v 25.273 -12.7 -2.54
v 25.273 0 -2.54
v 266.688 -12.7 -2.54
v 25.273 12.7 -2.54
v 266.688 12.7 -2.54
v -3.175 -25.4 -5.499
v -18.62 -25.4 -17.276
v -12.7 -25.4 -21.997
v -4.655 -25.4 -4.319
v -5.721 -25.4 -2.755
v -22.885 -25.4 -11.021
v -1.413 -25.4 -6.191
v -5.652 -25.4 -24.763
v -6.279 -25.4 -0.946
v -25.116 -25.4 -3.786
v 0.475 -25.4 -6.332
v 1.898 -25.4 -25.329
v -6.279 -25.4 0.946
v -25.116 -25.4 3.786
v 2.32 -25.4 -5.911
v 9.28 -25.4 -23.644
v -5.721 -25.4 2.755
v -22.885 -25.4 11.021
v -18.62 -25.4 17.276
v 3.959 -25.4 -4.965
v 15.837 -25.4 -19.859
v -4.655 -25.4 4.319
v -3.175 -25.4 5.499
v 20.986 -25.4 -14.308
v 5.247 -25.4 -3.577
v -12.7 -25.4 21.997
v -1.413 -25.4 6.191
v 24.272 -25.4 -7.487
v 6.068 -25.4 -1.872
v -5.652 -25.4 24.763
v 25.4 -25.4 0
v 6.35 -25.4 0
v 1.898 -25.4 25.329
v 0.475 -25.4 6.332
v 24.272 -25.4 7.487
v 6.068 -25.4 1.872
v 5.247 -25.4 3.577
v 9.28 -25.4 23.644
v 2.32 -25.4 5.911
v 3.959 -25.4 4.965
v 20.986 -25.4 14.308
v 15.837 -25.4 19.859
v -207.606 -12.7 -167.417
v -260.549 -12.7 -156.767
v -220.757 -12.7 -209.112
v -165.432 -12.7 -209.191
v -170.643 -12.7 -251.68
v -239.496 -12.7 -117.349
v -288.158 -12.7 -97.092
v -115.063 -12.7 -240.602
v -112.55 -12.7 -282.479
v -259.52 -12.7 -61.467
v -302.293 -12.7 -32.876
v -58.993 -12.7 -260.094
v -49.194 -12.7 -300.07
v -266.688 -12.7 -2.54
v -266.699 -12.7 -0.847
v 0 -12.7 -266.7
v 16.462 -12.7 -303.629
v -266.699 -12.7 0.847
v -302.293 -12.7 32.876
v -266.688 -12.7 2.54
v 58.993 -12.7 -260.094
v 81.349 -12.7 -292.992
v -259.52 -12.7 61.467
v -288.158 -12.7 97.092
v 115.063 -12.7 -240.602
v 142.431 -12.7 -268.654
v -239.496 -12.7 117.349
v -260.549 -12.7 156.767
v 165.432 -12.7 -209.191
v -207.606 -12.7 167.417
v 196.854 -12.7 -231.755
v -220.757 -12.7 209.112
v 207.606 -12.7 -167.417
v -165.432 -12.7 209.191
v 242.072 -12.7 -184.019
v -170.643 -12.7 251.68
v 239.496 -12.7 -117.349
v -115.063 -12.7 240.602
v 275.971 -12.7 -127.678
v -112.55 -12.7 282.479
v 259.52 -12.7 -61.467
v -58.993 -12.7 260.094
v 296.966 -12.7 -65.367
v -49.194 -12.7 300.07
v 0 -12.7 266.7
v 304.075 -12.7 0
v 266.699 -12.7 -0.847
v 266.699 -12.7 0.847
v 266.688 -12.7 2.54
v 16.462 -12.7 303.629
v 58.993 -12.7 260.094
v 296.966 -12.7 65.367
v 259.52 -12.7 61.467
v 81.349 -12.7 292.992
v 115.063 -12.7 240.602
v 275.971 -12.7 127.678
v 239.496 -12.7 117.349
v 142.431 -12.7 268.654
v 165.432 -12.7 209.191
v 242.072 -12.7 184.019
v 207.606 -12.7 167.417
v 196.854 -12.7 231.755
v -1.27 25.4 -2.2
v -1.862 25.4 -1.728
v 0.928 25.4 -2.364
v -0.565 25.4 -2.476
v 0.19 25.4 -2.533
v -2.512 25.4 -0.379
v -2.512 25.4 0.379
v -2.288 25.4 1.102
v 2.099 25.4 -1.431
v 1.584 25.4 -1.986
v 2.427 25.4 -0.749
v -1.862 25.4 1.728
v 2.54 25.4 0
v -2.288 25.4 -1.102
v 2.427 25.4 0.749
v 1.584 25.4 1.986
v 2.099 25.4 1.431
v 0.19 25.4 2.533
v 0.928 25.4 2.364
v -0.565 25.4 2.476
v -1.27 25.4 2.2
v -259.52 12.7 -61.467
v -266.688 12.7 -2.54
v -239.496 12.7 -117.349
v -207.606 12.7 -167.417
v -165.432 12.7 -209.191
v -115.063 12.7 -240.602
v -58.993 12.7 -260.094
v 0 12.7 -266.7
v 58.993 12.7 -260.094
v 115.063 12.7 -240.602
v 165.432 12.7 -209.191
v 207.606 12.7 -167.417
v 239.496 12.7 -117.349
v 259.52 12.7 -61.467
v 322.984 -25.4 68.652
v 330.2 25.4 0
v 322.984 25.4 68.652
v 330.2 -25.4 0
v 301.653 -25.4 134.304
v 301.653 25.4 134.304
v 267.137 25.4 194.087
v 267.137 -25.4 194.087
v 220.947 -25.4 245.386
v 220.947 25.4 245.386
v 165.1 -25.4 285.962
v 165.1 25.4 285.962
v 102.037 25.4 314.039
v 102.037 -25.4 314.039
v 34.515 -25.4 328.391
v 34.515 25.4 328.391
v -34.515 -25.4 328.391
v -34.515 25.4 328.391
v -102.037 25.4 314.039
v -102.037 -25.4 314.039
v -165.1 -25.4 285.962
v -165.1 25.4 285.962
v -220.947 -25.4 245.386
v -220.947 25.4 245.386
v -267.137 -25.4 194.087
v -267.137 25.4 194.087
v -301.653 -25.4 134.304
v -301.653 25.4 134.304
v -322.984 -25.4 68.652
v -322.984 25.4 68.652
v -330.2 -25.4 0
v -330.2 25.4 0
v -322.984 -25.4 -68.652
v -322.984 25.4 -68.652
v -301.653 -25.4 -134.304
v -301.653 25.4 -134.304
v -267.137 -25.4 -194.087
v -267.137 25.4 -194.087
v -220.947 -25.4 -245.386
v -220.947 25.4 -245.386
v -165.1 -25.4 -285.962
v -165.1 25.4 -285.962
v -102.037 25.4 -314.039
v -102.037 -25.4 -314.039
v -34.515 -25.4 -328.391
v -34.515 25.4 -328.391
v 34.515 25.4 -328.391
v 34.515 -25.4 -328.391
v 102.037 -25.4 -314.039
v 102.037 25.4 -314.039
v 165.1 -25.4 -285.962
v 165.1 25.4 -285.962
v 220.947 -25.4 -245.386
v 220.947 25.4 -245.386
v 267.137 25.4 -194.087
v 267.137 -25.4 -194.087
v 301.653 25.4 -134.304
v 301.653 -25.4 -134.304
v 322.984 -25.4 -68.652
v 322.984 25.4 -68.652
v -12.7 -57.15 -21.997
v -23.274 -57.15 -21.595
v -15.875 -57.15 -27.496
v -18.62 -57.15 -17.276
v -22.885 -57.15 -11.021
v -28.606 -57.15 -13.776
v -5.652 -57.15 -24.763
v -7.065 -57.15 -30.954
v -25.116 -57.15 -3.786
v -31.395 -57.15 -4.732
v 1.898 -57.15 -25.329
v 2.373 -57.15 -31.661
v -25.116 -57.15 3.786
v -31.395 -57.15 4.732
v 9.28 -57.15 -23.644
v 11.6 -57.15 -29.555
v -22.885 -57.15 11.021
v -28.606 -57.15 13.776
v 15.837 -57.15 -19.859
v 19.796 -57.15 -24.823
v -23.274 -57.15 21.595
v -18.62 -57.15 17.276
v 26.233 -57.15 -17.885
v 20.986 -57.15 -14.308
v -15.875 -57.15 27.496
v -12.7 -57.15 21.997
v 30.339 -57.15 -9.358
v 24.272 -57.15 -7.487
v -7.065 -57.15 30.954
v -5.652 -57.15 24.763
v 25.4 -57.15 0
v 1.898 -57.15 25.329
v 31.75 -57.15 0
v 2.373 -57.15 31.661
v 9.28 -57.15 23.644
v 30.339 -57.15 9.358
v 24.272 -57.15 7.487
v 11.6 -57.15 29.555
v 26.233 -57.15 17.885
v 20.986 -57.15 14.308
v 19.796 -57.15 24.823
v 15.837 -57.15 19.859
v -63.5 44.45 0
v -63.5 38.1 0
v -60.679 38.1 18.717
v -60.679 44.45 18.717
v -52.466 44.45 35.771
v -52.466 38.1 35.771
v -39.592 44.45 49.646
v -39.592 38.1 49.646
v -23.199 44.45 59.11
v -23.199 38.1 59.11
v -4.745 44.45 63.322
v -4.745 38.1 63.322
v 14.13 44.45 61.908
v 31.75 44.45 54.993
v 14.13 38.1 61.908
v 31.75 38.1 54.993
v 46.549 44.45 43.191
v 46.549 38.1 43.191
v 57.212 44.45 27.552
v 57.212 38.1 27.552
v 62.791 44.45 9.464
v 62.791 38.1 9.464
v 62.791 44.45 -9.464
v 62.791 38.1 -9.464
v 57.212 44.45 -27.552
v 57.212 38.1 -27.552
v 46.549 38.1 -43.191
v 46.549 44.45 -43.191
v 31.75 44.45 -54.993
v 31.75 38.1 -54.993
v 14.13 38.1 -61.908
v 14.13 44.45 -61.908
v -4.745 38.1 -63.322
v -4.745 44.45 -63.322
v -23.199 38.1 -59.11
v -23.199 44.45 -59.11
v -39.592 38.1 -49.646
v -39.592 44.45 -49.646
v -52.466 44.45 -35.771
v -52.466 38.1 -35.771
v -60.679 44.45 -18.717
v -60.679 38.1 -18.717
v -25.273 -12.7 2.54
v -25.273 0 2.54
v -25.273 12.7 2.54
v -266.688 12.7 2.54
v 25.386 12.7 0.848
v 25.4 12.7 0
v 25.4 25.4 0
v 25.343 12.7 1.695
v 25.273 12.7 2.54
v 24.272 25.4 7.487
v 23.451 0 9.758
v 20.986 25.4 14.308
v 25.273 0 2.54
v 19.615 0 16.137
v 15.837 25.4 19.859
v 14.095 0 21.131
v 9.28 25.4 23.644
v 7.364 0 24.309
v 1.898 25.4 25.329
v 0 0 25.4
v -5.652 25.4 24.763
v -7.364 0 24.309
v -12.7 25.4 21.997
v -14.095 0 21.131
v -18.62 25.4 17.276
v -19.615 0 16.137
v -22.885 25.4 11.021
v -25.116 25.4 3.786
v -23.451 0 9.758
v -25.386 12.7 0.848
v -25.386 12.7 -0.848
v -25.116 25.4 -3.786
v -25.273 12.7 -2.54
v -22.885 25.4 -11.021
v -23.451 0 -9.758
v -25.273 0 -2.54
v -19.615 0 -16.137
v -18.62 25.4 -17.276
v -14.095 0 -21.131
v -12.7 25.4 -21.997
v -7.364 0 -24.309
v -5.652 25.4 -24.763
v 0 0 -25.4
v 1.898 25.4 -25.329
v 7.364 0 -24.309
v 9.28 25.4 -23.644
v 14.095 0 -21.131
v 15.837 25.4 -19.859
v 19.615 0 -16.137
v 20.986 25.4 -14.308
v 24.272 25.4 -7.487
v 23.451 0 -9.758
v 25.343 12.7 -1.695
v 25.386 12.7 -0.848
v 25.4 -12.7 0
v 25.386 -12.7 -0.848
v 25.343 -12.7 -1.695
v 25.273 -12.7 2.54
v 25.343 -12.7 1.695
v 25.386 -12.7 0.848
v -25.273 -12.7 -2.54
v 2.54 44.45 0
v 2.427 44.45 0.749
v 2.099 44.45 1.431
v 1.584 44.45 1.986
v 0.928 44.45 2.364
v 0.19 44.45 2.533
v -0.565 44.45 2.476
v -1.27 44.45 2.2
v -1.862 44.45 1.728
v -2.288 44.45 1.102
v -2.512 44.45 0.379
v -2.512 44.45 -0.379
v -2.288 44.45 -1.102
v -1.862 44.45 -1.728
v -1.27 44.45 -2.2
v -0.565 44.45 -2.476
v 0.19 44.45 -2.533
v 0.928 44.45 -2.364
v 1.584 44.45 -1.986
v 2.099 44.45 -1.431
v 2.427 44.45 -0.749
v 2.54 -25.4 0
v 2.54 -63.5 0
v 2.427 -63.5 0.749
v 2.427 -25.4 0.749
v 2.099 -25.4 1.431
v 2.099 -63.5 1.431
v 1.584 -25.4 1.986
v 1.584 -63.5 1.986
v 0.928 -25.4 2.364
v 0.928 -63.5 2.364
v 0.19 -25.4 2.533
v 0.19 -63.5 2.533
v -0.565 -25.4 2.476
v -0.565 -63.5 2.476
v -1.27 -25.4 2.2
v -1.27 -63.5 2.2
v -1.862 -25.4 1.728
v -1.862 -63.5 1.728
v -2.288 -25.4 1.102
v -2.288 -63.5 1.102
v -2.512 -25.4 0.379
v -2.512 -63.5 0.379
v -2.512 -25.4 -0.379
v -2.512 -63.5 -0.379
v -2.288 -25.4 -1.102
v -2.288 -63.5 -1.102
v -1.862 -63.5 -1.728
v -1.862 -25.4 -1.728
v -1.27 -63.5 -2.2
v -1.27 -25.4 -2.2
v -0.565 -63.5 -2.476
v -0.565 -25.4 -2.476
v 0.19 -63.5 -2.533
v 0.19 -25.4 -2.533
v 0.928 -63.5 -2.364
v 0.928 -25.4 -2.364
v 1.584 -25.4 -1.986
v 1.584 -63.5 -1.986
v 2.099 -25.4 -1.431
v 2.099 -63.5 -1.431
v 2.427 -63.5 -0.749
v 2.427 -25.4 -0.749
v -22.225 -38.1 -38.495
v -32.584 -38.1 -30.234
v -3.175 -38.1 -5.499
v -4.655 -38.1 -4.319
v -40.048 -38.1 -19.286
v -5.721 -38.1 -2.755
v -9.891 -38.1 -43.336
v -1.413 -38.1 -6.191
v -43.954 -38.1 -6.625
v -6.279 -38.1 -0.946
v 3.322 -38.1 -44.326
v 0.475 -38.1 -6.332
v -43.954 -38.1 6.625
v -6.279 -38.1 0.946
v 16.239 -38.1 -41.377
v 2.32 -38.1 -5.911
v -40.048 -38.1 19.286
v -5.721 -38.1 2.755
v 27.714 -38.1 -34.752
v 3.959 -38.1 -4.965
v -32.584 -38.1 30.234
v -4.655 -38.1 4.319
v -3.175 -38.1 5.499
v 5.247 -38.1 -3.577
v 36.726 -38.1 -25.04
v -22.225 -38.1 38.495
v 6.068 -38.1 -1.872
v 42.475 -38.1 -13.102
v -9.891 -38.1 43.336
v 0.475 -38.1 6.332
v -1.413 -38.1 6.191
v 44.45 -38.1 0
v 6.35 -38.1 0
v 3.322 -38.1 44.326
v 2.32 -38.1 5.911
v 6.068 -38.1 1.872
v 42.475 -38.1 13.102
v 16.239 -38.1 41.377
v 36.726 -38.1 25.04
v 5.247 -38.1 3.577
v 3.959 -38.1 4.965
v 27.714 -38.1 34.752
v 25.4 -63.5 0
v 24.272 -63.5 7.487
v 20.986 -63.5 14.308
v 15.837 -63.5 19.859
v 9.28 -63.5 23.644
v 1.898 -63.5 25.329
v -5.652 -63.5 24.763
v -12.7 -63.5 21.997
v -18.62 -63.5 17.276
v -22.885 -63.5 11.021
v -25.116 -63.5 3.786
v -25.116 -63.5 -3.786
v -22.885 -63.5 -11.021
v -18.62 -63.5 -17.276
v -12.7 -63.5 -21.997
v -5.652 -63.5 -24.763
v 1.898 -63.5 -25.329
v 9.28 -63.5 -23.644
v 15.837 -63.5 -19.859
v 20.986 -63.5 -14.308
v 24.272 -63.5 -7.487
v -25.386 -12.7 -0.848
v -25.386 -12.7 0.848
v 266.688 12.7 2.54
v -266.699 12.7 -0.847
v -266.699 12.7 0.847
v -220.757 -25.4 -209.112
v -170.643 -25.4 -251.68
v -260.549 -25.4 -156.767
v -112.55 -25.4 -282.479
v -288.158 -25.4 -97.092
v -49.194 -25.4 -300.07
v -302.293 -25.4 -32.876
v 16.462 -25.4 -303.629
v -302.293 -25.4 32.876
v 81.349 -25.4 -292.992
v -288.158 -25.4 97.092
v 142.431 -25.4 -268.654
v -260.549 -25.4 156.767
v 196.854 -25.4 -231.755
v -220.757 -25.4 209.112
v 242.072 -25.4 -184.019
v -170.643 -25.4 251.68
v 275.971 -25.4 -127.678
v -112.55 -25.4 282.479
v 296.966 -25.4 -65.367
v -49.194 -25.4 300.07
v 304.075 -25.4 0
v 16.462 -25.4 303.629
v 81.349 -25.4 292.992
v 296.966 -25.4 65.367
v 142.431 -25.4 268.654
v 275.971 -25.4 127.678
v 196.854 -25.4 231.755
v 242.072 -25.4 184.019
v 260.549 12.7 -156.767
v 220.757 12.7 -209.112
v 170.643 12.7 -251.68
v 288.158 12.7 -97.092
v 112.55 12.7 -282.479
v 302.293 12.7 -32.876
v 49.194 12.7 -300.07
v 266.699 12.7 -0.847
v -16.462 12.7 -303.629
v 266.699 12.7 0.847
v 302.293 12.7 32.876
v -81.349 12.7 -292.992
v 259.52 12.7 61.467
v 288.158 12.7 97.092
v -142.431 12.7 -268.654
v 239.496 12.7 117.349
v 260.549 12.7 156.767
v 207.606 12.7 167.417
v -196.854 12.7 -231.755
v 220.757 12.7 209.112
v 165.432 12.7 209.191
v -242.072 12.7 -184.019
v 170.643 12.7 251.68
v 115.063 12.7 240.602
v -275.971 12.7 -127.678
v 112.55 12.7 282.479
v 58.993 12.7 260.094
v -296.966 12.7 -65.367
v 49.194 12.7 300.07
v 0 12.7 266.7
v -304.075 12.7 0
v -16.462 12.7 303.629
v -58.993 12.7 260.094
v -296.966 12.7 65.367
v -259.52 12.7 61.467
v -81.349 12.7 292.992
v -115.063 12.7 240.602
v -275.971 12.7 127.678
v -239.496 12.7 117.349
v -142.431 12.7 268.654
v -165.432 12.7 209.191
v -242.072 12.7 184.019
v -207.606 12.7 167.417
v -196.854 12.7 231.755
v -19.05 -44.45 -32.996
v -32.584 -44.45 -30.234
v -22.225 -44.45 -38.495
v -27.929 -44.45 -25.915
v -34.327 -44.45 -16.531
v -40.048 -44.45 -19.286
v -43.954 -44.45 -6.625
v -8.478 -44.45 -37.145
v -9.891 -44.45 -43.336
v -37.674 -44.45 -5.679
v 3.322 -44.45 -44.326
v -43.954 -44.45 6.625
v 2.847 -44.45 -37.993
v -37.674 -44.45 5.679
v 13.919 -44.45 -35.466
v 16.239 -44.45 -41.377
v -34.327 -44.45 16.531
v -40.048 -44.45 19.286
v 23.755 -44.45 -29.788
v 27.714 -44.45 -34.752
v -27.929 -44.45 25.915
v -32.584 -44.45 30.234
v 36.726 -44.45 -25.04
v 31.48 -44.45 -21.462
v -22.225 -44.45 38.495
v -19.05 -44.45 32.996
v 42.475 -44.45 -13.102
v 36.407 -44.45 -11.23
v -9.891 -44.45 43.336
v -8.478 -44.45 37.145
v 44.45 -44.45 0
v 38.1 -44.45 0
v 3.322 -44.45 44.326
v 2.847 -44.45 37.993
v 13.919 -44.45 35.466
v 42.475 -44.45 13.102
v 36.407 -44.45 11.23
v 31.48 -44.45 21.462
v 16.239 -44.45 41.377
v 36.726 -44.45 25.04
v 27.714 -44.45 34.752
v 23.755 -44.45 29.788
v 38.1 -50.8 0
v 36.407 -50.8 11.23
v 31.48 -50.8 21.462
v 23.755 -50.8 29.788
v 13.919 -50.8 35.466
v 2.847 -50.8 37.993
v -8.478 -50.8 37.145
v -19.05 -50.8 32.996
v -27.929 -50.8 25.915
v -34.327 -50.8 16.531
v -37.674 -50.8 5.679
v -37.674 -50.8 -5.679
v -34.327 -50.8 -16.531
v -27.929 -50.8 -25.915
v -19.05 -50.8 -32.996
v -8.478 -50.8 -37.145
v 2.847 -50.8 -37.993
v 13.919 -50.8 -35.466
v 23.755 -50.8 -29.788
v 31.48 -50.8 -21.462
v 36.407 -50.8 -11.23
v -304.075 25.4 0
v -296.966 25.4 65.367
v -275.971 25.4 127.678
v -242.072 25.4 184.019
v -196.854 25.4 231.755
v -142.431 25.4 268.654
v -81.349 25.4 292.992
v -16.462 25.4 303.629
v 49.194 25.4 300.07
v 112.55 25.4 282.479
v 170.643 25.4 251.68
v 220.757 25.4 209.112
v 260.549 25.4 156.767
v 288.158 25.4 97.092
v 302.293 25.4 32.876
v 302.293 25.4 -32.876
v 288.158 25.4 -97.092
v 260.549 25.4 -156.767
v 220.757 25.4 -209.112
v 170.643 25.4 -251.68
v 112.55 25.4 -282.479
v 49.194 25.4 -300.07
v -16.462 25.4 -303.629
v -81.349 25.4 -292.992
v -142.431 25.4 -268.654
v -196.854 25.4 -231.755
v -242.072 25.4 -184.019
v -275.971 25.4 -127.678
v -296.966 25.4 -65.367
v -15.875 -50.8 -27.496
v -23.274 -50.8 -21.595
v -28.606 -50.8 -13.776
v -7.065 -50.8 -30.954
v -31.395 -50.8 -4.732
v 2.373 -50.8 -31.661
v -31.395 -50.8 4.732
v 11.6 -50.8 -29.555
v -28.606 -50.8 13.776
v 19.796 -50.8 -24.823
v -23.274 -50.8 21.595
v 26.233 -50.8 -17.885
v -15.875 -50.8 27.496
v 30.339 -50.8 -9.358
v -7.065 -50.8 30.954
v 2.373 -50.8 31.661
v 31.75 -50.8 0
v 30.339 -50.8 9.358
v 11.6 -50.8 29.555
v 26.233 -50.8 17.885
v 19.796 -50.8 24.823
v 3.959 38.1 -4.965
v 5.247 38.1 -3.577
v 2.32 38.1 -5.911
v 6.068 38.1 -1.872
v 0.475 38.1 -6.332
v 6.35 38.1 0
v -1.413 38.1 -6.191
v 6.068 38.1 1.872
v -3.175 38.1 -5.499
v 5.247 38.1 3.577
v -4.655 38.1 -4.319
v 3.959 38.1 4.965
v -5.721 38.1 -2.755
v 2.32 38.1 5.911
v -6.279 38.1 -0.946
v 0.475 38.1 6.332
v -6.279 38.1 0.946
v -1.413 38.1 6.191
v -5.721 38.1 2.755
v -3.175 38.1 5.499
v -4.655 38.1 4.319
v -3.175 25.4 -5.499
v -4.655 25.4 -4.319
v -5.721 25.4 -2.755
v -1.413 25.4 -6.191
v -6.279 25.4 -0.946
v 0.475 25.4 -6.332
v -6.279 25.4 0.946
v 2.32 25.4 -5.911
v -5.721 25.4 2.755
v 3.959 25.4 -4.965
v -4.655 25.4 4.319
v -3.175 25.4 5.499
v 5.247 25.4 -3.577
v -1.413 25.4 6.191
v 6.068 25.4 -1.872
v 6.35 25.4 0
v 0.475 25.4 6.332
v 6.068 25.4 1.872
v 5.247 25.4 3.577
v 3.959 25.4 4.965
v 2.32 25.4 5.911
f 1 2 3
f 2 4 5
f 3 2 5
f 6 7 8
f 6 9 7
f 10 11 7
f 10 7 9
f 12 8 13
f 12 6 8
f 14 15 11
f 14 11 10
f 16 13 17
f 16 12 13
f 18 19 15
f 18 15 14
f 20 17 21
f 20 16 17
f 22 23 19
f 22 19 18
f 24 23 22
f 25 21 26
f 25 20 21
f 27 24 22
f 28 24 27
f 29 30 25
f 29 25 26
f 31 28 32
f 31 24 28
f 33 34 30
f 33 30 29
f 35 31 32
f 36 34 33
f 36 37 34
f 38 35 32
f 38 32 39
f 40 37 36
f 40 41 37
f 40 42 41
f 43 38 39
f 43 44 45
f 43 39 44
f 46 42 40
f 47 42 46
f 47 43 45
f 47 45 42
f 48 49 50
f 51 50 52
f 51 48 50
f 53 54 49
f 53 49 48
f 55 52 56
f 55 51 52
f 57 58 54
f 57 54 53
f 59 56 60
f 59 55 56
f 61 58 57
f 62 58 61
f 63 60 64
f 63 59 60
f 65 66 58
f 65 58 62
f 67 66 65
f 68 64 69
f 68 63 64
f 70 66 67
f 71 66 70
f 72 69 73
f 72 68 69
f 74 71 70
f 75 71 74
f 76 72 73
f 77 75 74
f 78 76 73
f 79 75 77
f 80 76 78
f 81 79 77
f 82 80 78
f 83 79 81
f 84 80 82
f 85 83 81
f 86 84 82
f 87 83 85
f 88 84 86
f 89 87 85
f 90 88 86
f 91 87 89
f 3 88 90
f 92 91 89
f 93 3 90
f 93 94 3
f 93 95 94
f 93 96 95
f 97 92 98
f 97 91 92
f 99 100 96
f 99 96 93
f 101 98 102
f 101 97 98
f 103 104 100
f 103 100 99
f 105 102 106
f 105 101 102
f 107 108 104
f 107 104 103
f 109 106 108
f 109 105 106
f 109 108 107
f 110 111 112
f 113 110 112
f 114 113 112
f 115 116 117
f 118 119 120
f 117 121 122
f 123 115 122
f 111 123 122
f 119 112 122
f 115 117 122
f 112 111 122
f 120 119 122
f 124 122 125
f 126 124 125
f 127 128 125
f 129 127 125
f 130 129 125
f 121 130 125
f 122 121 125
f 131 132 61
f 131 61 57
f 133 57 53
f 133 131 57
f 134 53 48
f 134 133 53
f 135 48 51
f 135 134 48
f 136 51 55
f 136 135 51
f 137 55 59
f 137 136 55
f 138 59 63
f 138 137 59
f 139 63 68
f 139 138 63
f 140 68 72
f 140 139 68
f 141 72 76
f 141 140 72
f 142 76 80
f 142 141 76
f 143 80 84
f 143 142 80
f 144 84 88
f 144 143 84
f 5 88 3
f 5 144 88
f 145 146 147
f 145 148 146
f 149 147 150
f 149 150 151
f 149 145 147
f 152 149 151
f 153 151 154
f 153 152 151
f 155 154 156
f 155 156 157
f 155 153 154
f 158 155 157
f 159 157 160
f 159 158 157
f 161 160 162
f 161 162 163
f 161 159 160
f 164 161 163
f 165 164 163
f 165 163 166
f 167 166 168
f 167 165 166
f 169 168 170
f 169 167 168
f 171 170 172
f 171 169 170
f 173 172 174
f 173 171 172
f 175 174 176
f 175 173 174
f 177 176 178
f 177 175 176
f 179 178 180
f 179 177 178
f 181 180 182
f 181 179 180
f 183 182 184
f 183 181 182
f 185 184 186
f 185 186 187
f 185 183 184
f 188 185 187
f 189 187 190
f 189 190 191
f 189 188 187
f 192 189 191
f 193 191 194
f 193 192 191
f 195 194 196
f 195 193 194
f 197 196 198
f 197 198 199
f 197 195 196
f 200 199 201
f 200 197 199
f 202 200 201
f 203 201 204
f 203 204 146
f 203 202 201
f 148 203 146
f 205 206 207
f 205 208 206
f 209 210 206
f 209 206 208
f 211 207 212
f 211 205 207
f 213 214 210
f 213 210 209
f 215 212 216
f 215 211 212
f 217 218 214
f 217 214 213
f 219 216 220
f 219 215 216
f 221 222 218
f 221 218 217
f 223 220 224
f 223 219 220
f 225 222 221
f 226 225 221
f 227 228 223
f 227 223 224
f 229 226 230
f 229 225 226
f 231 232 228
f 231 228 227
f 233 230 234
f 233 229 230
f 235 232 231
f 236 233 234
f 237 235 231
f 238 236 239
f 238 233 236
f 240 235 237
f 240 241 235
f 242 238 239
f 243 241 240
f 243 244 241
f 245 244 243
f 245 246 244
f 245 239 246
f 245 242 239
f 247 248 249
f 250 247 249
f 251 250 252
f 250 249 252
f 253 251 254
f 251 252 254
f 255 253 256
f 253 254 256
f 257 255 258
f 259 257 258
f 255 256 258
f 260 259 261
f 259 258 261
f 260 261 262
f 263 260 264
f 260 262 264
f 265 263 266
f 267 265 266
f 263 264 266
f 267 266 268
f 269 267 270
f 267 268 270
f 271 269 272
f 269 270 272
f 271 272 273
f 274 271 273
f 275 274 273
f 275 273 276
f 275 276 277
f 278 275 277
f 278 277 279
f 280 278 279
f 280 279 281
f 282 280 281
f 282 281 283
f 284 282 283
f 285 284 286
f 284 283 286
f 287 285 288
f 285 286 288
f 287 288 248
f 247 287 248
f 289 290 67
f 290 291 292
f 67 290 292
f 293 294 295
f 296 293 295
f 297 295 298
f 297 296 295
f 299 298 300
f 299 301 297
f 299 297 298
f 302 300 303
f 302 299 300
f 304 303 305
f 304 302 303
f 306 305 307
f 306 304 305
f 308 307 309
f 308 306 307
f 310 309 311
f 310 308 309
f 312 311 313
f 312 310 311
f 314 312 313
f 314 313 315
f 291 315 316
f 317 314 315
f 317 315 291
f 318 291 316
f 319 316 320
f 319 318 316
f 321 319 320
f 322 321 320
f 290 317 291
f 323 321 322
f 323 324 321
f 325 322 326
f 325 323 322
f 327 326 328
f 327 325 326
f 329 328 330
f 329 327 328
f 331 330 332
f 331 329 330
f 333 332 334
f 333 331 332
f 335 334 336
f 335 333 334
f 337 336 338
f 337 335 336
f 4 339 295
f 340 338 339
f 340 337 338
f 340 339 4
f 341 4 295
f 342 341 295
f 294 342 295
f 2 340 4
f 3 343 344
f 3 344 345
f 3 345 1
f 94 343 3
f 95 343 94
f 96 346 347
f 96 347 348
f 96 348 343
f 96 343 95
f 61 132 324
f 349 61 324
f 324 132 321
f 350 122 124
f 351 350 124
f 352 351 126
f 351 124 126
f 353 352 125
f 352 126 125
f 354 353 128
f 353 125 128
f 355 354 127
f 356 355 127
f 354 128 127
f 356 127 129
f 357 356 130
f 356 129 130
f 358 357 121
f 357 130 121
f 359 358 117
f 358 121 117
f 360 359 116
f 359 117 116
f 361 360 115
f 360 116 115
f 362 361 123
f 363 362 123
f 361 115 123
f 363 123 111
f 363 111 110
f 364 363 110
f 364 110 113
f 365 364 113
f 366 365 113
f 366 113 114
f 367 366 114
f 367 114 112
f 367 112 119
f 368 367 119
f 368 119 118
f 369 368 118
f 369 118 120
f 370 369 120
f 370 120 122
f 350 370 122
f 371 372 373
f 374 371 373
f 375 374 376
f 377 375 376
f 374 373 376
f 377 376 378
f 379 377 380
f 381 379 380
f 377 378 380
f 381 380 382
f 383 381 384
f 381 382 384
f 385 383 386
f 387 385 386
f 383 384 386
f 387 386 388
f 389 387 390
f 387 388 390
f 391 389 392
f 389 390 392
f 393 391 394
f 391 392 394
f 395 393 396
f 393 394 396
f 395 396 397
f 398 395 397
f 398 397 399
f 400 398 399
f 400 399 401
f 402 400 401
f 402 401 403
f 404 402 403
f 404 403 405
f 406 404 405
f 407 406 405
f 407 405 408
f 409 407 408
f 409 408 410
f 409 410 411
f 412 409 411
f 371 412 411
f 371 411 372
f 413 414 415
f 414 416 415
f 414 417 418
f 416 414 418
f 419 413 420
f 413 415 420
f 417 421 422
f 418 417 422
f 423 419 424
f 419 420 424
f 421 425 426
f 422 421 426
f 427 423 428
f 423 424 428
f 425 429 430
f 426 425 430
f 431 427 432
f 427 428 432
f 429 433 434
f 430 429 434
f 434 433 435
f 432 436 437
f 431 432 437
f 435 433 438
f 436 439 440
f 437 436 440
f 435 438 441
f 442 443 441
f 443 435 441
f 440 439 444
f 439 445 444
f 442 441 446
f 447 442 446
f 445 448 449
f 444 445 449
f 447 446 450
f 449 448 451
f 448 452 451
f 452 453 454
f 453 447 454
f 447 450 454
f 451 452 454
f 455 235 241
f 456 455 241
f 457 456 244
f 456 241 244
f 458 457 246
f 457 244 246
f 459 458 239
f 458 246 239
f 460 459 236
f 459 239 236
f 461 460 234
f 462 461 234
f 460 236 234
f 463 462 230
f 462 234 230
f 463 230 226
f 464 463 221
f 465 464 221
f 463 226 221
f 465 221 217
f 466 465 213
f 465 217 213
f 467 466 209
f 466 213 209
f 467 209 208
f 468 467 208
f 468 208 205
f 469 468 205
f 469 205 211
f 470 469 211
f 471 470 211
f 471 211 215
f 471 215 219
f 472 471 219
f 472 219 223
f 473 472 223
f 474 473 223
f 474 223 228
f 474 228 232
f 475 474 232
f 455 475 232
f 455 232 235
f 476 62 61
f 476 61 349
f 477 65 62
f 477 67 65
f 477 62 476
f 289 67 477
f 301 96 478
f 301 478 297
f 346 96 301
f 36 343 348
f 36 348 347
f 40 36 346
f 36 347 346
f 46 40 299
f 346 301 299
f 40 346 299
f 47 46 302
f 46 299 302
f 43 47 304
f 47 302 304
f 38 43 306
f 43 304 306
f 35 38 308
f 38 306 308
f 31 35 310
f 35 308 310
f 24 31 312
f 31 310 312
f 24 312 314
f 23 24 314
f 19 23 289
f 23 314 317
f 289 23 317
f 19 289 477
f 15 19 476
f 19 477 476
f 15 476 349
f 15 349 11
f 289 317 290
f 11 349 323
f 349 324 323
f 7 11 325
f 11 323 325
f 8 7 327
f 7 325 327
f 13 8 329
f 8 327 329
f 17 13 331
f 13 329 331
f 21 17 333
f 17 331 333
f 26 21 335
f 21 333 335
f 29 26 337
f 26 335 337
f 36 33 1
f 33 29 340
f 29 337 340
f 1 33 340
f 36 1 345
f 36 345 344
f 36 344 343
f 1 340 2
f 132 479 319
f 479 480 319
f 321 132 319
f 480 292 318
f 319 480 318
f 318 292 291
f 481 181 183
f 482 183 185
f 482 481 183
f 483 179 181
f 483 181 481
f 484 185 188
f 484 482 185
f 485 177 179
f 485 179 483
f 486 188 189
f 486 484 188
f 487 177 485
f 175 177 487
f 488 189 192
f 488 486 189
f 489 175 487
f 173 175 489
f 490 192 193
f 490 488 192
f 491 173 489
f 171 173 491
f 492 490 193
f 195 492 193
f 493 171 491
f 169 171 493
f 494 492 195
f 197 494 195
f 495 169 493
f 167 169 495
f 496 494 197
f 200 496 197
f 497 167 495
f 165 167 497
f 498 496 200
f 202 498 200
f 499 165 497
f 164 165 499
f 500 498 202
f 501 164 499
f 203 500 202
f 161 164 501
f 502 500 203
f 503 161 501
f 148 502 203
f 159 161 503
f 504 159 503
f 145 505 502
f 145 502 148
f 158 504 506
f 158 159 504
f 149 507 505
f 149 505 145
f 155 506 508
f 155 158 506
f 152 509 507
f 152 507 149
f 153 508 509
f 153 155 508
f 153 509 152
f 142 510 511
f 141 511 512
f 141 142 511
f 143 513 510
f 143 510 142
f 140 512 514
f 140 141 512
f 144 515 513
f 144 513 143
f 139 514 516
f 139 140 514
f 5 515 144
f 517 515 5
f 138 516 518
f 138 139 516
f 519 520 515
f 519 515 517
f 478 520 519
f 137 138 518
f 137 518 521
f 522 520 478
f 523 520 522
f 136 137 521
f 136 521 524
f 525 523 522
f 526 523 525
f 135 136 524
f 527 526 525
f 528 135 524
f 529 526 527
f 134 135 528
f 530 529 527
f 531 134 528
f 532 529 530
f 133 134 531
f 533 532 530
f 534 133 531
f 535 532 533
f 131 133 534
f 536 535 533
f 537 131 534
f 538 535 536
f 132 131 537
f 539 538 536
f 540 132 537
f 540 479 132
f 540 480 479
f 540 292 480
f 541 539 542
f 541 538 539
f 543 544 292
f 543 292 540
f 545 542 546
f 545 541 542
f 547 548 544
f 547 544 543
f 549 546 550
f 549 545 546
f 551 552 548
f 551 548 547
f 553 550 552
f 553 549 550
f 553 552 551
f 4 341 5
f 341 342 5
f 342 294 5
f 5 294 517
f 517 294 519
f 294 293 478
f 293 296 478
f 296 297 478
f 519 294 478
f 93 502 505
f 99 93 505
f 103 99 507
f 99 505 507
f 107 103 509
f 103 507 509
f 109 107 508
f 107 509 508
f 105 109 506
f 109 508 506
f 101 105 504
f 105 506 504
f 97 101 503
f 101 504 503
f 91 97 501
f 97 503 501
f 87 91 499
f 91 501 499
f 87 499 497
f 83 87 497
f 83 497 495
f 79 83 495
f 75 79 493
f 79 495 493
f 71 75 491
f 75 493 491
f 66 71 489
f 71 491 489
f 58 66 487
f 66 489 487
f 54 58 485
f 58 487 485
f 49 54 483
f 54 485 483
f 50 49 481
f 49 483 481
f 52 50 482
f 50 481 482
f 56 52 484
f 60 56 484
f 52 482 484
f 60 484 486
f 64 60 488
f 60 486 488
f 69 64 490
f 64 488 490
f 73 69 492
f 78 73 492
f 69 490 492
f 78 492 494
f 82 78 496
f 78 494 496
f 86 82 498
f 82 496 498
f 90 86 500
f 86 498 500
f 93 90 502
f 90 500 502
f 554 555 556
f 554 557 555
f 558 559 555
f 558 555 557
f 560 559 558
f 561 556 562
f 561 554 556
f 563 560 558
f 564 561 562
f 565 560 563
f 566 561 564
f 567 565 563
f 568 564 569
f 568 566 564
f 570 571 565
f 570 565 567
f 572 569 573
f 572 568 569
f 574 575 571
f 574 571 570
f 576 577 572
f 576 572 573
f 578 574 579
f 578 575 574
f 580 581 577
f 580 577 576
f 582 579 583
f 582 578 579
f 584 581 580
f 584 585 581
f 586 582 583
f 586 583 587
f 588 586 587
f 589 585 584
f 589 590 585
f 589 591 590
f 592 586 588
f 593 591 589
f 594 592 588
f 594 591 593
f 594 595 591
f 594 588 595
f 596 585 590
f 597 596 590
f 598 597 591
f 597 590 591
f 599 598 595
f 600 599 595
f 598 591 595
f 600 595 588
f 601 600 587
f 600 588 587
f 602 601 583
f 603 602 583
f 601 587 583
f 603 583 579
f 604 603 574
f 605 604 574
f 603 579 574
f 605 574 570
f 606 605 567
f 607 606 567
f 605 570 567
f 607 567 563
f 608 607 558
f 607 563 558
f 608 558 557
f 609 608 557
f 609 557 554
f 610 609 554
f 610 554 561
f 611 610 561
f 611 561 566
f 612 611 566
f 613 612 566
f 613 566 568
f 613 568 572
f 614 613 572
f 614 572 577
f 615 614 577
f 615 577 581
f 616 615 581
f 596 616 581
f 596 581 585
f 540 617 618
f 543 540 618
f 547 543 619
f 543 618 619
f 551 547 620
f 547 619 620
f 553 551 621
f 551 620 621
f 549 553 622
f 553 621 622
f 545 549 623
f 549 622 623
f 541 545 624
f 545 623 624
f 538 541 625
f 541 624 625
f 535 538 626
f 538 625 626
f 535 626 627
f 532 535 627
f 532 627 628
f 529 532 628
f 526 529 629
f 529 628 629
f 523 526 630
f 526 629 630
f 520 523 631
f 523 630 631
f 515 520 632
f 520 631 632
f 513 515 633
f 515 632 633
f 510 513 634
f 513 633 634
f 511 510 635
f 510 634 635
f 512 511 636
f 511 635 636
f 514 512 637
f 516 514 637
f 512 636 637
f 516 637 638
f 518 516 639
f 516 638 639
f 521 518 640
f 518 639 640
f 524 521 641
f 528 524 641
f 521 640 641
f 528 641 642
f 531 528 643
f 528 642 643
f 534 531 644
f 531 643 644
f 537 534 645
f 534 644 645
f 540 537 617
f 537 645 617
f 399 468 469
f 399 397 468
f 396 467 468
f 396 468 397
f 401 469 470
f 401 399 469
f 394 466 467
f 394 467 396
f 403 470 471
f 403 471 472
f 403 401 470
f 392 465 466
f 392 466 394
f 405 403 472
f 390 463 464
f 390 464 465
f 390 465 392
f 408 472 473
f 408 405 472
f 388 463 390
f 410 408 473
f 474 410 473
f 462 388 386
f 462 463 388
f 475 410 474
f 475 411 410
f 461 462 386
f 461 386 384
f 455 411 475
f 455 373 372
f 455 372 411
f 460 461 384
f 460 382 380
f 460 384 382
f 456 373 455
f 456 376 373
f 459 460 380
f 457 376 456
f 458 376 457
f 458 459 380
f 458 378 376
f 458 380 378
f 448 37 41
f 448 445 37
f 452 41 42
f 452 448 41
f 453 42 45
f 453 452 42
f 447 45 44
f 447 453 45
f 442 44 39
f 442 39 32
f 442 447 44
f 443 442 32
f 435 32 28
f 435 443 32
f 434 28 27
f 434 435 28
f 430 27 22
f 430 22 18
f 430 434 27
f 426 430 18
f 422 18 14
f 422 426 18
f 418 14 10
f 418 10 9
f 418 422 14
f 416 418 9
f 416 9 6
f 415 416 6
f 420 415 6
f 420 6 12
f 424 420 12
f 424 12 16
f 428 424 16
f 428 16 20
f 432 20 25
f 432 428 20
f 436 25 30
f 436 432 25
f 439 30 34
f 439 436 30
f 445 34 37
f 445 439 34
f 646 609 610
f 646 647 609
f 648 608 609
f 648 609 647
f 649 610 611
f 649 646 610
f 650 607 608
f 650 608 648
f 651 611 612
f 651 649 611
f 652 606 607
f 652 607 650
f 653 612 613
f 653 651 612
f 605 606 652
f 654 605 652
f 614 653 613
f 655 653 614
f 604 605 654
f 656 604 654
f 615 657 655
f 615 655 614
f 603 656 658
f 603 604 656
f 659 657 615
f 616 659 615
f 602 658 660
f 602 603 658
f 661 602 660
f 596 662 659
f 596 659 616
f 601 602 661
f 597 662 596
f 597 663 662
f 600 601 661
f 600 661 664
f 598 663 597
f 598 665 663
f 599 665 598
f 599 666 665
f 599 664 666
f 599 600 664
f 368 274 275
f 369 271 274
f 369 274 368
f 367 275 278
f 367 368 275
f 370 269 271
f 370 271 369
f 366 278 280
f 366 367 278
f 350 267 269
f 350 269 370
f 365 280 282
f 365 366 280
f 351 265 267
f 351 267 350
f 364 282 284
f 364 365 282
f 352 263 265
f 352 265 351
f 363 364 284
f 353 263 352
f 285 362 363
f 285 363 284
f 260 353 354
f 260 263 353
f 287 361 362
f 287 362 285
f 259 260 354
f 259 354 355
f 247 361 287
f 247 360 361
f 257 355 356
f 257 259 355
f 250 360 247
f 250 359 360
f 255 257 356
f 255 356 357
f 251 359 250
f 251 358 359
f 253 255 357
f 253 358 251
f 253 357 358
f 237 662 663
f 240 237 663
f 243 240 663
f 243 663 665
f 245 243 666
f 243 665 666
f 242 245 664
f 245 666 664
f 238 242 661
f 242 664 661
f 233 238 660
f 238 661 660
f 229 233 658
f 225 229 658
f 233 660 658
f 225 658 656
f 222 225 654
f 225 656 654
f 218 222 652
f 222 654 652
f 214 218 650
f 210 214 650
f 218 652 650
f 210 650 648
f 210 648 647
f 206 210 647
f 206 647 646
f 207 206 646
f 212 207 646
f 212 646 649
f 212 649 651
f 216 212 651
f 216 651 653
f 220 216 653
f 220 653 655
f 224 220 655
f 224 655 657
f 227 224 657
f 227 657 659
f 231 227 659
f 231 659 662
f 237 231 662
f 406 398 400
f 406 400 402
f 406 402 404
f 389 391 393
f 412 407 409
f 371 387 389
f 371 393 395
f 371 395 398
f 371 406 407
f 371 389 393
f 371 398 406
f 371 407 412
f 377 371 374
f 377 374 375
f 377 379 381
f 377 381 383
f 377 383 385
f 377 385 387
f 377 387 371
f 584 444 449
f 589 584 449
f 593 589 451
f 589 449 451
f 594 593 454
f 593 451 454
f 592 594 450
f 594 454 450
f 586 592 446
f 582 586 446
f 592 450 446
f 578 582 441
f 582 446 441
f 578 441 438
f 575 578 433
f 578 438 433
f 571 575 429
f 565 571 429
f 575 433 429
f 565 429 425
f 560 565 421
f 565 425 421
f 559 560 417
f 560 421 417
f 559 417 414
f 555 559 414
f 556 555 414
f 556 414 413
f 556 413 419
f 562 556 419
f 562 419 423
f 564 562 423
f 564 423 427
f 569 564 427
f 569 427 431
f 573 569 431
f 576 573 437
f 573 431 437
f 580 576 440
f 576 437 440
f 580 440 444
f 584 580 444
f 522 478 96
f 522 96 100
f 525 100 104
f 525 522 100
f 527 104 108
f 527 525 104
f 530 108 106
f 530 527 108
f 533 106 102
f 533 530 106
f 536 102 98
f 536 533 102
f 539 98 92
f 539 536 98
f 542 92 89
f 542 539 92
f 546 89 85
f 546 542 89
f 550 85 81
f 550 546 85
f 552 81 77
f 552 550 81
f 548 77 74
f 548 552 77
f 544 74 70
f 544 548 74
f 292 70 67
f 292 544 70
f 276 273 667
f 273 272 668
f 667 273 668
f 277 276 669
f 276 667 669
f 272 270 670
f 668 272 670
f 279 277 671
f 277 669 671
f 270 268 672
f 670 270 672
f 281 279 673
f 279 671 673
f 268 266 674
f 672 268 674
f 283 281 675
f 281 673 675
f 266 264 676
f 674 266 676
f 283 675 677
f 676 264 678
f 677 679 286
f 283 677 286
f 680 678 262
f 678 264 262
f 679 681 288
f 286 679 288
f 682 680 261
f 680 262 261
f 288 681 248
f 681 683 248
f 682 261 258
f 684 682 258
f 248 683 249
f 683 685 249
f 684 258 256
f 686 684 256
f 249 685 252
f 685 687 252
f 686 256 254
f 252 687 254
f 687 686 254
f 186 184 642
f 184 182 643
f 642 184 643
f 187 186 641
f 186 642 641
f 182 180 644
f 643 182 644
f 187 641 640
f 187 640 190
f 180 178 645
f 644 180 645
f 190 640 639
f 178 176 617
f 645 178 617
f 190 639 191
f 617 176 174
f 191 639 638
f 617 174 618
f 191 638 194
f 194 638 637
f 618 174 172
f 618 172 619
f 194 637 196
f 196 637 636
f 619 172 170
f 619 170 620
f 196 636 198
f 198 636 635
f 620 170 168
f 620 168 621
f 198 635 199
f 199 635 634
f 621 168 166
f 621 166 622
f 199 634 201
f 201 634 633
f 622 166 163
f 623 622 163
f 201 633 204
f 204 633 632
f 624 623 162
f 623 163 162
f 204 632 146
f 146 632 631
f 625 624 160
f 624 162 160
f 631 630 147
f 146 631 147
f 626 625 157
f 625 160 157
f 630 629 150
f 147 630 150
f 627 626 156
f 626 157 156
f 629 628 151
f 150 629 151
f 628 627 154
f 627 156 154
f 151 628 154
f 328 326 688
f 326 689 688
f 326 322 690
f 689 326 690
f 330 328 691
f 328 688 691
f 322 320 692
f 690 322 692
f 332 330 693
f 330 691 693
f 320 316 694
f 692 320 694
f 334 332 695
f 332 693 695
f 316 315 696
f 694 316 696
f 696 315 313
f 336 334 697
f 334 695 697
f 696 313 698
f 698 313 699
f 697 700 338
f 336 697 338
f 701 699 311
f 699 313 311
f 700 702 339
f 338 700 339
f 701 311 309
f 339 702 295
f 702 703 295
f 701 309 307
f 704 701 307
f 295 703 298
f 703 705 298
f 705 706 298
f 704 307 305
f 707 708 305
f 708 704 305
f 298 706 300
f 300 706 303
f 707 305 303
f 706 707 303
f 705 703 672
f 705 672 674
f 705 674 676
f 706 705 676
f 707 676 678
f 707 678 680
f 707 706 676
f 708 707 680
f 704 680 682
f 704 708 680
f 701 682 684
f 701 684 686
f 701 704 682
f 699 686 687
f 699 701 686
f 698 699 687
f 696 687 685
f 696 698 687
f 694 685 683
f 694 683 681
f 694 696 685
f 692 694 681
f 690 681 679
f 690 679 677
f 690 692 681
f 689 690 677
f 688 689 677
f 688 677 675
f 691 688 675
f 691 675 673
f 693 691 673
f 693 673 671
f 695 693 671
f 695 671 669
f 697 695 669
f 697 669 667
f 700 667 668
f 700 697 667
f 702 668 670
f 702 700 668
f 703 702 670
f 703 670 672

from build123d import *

# Parameters (mm, degrees)
F0_R           = 330.2
F0_R_2         = 266.7
F1_DEPTH       = 25.4
F1_DEPTH_BACK  = 25.4
F3_R           = 44.45
F3_R_2         = 38.1
F4_DEPTH       = 6.35
F3_R_3         = 31.75
F5_DEPTH       = 12.7
F3_R_4         = 25.4
F6_DEPTH       = 19.05
F3_R_5         = 19.05
F7_DEPTH       = 25.4
F9_R           = 63.5
F10_DEPTH      = 6.35
F3_R_6         = 6.35
F11_DEPTH      = 25.4
F11_DEPTH_BACK = 76.2
F12_R          = 19.05
F12_R_2        = 2.54
F13_DEPTH      = 25.4
F14_DEPTH      = 107.951
F16_DEPTH      = 12.7
F16_DEPTH_BACK = 12.7
F17_DEPTH      = 107.951
F18_R          = 25.4
F19_DEPTH      = 25.4
F19_DEPTH_BACK = 25.4
F20_R          = 304.0753924765
F20_R_2        = 266.7
F21_DEPTH      = 12.7
F22_R          = 304.0753924765
F22_R_2        = 266.7
F23_DEPTH      = 12.7


with BuildPart() as f1:
    # F0 (on Front) → F1 (new body, two sides)
    with BuildSketch(Plane.XZ) as f1_sk:
        Circle(F0_R)
        Circle(F0_R_2, mode=Mode.SUBTRACT)
    extrude(amount=F1_DEPTH)
    extrude(f1_sk.sketch, amount=-F1_DEPTH_BACK)



with BuildPart() as f4:
    # F3 (on offset) → F4 (new body)
    with BuildSketch(Plane.XZ.offset(38.1)):
        Circle(F3_R)
        Circle(F3_R_2, mode=Mode.SUBTRACT)
    extrude(amount=F4_DEPTH)

    # F3 (on offset) → F5 (join)
    with BuildSketch(Plane.XZ.offset(38.1)):
        Circle(F3_R_2)
        Circle(F3_R_3, mode=Mode.SUBTRACT)
    extrude(amount=F5_DEPTH)

    # F3 (on offset) → F6 (join)
    with BuildSketch(Plane.XZ.offset(38.1)):
        Circle(F3_R_3)
        Circle(F3_R_4, mode=Mode.SUBTRACT)
    extrude(amount=F6_DEPTH)

    # F3 (on offset) → F7 (join)
    with BuildSketch(Plane.XZ.offset(38.1)):
        Circle(F3_R_4)
        Circle(F3_R_5, mode=Mode.SUBTRACT)
    extrude(amount=F7_DEPTH)



with BuildPart() as f10:
    # F9 (on offset) → F10 (new body)
    with BuildSketch(Plane(origin=(0, 38.1, 0), x_dir=(-1, 0, 0), z_dir=(0, 1, 0))):
        Circle(F9_R)
    extrude(amount=F10_DEPTH)

    # F3 (on offset) → F11 (join, two sides)
    with BuildSketch(Plane.XZ.offset(38.1)) as f11_sk:
        Circle(F3_R_6)
    extrude(amount=F11_DEPTH)
    extrude(f11_sk.sketch, amount=-F11_DEPTH_BACK)


with BuildPart() as f4_1:
    add(f4.part)

    add(f10.part)  # F13 merges F10
    # F12 (on face) → F13 (join)
    with BuildSketch(Plane.XZ.offset(63.5)):
        Circle(F12_R)
        Circle(F12_R_2, mode=Mode.SUBTRACT)
    extrude(amount=-F13_DEPTH)

    # F12 (on face) → F14 (cut, through all)
    with BuildSketch(Plane.XZ.offset(63.5)):
        Circle(F12_R_2)
    extrude(amount=-F14_DEPTH, mode=Mode.SUBTRACT)


with BuildPart() as f1_1:
    add(f1.part)

    add(f4_1.part)  # F16 merges F4
    # F15 (on Front) → F16 (join, two sides)
    with BuildSketch(Plane.XZ) as f16_sk:
        with BuildLine():
            Line((304.8, 2.54), (5.8198711326, 2.54))
            ThreePointArc((5.8198711326, 2.54), (6.2160550871, 1.2973662374), (6.35, 0))
            ThreePointArc((6.35, 0), (6.2160550871, -1.2973662374), (5.8198711326, -2.54))
            Line((5.8198711326, -2.54), (304.8, -2.54))
            Line((304.8, -2.54), (304.8, 2.54))
        make_face()
        with BuildLine():
            ThreePointArc((-5.8198711326, -2.54), (-6.35, 0), (-5.8198711326, 2.54))
            Line((-5.8198711326, 2.54), (-304.8, 2.54))
            Line((-304.8, 2.54), (-304.8, -2.54))
            Line((-304.8, -2.54), (-5.8198711326, -2.54))
        make_face()
    extrude(amount=F16_DEPTH)
    extrude(f16_sk.sketch, amount=-F16_DEPTH_BACK)

    # F12 (on face) → F17 (cut, through all)
    with BuildSketch(Plane.XZ.offset(63.5)):
        Circle(F12_R_2)
    extrude(amount=-F17_DEPTH, mode=Mode.SUBTRACT)

    # F18 (on Front) → F19 (join, two sides)
    with BuildSketch(Plane.XZ) as f19_sk:
        Circle(F18_R)
    extrude(amount=F19_DEPTH)
    extrude(f19_sk.sketch, amount=-F19_DEPTH_BACK)

    # F20 (on face) → F21 (cut)
    with BuildSketch(Plane.XZ.offset(25.4)):
        Circle(F20_R)
        Circle(F20_R_2, mode=Mode.SUBTRACT)
    extrude(amount=-F21_DEPTH, mode=Mode.SUBTRACT)

    # F22 (on face) → F23 (cut)
    with BuildSketch(Plane(origin=(0, 25.4, 0), x_dir=(-1, 0, 0), z_dir=(0, 1, 0))):
        Circle(F22_R)
        Circle(F22_R_2, mode=Mode.SUBTRACT)
    extrude(amount=-F23_DEPTH, mode=Mode.SUBTRACT)


solid = f1_1.part
